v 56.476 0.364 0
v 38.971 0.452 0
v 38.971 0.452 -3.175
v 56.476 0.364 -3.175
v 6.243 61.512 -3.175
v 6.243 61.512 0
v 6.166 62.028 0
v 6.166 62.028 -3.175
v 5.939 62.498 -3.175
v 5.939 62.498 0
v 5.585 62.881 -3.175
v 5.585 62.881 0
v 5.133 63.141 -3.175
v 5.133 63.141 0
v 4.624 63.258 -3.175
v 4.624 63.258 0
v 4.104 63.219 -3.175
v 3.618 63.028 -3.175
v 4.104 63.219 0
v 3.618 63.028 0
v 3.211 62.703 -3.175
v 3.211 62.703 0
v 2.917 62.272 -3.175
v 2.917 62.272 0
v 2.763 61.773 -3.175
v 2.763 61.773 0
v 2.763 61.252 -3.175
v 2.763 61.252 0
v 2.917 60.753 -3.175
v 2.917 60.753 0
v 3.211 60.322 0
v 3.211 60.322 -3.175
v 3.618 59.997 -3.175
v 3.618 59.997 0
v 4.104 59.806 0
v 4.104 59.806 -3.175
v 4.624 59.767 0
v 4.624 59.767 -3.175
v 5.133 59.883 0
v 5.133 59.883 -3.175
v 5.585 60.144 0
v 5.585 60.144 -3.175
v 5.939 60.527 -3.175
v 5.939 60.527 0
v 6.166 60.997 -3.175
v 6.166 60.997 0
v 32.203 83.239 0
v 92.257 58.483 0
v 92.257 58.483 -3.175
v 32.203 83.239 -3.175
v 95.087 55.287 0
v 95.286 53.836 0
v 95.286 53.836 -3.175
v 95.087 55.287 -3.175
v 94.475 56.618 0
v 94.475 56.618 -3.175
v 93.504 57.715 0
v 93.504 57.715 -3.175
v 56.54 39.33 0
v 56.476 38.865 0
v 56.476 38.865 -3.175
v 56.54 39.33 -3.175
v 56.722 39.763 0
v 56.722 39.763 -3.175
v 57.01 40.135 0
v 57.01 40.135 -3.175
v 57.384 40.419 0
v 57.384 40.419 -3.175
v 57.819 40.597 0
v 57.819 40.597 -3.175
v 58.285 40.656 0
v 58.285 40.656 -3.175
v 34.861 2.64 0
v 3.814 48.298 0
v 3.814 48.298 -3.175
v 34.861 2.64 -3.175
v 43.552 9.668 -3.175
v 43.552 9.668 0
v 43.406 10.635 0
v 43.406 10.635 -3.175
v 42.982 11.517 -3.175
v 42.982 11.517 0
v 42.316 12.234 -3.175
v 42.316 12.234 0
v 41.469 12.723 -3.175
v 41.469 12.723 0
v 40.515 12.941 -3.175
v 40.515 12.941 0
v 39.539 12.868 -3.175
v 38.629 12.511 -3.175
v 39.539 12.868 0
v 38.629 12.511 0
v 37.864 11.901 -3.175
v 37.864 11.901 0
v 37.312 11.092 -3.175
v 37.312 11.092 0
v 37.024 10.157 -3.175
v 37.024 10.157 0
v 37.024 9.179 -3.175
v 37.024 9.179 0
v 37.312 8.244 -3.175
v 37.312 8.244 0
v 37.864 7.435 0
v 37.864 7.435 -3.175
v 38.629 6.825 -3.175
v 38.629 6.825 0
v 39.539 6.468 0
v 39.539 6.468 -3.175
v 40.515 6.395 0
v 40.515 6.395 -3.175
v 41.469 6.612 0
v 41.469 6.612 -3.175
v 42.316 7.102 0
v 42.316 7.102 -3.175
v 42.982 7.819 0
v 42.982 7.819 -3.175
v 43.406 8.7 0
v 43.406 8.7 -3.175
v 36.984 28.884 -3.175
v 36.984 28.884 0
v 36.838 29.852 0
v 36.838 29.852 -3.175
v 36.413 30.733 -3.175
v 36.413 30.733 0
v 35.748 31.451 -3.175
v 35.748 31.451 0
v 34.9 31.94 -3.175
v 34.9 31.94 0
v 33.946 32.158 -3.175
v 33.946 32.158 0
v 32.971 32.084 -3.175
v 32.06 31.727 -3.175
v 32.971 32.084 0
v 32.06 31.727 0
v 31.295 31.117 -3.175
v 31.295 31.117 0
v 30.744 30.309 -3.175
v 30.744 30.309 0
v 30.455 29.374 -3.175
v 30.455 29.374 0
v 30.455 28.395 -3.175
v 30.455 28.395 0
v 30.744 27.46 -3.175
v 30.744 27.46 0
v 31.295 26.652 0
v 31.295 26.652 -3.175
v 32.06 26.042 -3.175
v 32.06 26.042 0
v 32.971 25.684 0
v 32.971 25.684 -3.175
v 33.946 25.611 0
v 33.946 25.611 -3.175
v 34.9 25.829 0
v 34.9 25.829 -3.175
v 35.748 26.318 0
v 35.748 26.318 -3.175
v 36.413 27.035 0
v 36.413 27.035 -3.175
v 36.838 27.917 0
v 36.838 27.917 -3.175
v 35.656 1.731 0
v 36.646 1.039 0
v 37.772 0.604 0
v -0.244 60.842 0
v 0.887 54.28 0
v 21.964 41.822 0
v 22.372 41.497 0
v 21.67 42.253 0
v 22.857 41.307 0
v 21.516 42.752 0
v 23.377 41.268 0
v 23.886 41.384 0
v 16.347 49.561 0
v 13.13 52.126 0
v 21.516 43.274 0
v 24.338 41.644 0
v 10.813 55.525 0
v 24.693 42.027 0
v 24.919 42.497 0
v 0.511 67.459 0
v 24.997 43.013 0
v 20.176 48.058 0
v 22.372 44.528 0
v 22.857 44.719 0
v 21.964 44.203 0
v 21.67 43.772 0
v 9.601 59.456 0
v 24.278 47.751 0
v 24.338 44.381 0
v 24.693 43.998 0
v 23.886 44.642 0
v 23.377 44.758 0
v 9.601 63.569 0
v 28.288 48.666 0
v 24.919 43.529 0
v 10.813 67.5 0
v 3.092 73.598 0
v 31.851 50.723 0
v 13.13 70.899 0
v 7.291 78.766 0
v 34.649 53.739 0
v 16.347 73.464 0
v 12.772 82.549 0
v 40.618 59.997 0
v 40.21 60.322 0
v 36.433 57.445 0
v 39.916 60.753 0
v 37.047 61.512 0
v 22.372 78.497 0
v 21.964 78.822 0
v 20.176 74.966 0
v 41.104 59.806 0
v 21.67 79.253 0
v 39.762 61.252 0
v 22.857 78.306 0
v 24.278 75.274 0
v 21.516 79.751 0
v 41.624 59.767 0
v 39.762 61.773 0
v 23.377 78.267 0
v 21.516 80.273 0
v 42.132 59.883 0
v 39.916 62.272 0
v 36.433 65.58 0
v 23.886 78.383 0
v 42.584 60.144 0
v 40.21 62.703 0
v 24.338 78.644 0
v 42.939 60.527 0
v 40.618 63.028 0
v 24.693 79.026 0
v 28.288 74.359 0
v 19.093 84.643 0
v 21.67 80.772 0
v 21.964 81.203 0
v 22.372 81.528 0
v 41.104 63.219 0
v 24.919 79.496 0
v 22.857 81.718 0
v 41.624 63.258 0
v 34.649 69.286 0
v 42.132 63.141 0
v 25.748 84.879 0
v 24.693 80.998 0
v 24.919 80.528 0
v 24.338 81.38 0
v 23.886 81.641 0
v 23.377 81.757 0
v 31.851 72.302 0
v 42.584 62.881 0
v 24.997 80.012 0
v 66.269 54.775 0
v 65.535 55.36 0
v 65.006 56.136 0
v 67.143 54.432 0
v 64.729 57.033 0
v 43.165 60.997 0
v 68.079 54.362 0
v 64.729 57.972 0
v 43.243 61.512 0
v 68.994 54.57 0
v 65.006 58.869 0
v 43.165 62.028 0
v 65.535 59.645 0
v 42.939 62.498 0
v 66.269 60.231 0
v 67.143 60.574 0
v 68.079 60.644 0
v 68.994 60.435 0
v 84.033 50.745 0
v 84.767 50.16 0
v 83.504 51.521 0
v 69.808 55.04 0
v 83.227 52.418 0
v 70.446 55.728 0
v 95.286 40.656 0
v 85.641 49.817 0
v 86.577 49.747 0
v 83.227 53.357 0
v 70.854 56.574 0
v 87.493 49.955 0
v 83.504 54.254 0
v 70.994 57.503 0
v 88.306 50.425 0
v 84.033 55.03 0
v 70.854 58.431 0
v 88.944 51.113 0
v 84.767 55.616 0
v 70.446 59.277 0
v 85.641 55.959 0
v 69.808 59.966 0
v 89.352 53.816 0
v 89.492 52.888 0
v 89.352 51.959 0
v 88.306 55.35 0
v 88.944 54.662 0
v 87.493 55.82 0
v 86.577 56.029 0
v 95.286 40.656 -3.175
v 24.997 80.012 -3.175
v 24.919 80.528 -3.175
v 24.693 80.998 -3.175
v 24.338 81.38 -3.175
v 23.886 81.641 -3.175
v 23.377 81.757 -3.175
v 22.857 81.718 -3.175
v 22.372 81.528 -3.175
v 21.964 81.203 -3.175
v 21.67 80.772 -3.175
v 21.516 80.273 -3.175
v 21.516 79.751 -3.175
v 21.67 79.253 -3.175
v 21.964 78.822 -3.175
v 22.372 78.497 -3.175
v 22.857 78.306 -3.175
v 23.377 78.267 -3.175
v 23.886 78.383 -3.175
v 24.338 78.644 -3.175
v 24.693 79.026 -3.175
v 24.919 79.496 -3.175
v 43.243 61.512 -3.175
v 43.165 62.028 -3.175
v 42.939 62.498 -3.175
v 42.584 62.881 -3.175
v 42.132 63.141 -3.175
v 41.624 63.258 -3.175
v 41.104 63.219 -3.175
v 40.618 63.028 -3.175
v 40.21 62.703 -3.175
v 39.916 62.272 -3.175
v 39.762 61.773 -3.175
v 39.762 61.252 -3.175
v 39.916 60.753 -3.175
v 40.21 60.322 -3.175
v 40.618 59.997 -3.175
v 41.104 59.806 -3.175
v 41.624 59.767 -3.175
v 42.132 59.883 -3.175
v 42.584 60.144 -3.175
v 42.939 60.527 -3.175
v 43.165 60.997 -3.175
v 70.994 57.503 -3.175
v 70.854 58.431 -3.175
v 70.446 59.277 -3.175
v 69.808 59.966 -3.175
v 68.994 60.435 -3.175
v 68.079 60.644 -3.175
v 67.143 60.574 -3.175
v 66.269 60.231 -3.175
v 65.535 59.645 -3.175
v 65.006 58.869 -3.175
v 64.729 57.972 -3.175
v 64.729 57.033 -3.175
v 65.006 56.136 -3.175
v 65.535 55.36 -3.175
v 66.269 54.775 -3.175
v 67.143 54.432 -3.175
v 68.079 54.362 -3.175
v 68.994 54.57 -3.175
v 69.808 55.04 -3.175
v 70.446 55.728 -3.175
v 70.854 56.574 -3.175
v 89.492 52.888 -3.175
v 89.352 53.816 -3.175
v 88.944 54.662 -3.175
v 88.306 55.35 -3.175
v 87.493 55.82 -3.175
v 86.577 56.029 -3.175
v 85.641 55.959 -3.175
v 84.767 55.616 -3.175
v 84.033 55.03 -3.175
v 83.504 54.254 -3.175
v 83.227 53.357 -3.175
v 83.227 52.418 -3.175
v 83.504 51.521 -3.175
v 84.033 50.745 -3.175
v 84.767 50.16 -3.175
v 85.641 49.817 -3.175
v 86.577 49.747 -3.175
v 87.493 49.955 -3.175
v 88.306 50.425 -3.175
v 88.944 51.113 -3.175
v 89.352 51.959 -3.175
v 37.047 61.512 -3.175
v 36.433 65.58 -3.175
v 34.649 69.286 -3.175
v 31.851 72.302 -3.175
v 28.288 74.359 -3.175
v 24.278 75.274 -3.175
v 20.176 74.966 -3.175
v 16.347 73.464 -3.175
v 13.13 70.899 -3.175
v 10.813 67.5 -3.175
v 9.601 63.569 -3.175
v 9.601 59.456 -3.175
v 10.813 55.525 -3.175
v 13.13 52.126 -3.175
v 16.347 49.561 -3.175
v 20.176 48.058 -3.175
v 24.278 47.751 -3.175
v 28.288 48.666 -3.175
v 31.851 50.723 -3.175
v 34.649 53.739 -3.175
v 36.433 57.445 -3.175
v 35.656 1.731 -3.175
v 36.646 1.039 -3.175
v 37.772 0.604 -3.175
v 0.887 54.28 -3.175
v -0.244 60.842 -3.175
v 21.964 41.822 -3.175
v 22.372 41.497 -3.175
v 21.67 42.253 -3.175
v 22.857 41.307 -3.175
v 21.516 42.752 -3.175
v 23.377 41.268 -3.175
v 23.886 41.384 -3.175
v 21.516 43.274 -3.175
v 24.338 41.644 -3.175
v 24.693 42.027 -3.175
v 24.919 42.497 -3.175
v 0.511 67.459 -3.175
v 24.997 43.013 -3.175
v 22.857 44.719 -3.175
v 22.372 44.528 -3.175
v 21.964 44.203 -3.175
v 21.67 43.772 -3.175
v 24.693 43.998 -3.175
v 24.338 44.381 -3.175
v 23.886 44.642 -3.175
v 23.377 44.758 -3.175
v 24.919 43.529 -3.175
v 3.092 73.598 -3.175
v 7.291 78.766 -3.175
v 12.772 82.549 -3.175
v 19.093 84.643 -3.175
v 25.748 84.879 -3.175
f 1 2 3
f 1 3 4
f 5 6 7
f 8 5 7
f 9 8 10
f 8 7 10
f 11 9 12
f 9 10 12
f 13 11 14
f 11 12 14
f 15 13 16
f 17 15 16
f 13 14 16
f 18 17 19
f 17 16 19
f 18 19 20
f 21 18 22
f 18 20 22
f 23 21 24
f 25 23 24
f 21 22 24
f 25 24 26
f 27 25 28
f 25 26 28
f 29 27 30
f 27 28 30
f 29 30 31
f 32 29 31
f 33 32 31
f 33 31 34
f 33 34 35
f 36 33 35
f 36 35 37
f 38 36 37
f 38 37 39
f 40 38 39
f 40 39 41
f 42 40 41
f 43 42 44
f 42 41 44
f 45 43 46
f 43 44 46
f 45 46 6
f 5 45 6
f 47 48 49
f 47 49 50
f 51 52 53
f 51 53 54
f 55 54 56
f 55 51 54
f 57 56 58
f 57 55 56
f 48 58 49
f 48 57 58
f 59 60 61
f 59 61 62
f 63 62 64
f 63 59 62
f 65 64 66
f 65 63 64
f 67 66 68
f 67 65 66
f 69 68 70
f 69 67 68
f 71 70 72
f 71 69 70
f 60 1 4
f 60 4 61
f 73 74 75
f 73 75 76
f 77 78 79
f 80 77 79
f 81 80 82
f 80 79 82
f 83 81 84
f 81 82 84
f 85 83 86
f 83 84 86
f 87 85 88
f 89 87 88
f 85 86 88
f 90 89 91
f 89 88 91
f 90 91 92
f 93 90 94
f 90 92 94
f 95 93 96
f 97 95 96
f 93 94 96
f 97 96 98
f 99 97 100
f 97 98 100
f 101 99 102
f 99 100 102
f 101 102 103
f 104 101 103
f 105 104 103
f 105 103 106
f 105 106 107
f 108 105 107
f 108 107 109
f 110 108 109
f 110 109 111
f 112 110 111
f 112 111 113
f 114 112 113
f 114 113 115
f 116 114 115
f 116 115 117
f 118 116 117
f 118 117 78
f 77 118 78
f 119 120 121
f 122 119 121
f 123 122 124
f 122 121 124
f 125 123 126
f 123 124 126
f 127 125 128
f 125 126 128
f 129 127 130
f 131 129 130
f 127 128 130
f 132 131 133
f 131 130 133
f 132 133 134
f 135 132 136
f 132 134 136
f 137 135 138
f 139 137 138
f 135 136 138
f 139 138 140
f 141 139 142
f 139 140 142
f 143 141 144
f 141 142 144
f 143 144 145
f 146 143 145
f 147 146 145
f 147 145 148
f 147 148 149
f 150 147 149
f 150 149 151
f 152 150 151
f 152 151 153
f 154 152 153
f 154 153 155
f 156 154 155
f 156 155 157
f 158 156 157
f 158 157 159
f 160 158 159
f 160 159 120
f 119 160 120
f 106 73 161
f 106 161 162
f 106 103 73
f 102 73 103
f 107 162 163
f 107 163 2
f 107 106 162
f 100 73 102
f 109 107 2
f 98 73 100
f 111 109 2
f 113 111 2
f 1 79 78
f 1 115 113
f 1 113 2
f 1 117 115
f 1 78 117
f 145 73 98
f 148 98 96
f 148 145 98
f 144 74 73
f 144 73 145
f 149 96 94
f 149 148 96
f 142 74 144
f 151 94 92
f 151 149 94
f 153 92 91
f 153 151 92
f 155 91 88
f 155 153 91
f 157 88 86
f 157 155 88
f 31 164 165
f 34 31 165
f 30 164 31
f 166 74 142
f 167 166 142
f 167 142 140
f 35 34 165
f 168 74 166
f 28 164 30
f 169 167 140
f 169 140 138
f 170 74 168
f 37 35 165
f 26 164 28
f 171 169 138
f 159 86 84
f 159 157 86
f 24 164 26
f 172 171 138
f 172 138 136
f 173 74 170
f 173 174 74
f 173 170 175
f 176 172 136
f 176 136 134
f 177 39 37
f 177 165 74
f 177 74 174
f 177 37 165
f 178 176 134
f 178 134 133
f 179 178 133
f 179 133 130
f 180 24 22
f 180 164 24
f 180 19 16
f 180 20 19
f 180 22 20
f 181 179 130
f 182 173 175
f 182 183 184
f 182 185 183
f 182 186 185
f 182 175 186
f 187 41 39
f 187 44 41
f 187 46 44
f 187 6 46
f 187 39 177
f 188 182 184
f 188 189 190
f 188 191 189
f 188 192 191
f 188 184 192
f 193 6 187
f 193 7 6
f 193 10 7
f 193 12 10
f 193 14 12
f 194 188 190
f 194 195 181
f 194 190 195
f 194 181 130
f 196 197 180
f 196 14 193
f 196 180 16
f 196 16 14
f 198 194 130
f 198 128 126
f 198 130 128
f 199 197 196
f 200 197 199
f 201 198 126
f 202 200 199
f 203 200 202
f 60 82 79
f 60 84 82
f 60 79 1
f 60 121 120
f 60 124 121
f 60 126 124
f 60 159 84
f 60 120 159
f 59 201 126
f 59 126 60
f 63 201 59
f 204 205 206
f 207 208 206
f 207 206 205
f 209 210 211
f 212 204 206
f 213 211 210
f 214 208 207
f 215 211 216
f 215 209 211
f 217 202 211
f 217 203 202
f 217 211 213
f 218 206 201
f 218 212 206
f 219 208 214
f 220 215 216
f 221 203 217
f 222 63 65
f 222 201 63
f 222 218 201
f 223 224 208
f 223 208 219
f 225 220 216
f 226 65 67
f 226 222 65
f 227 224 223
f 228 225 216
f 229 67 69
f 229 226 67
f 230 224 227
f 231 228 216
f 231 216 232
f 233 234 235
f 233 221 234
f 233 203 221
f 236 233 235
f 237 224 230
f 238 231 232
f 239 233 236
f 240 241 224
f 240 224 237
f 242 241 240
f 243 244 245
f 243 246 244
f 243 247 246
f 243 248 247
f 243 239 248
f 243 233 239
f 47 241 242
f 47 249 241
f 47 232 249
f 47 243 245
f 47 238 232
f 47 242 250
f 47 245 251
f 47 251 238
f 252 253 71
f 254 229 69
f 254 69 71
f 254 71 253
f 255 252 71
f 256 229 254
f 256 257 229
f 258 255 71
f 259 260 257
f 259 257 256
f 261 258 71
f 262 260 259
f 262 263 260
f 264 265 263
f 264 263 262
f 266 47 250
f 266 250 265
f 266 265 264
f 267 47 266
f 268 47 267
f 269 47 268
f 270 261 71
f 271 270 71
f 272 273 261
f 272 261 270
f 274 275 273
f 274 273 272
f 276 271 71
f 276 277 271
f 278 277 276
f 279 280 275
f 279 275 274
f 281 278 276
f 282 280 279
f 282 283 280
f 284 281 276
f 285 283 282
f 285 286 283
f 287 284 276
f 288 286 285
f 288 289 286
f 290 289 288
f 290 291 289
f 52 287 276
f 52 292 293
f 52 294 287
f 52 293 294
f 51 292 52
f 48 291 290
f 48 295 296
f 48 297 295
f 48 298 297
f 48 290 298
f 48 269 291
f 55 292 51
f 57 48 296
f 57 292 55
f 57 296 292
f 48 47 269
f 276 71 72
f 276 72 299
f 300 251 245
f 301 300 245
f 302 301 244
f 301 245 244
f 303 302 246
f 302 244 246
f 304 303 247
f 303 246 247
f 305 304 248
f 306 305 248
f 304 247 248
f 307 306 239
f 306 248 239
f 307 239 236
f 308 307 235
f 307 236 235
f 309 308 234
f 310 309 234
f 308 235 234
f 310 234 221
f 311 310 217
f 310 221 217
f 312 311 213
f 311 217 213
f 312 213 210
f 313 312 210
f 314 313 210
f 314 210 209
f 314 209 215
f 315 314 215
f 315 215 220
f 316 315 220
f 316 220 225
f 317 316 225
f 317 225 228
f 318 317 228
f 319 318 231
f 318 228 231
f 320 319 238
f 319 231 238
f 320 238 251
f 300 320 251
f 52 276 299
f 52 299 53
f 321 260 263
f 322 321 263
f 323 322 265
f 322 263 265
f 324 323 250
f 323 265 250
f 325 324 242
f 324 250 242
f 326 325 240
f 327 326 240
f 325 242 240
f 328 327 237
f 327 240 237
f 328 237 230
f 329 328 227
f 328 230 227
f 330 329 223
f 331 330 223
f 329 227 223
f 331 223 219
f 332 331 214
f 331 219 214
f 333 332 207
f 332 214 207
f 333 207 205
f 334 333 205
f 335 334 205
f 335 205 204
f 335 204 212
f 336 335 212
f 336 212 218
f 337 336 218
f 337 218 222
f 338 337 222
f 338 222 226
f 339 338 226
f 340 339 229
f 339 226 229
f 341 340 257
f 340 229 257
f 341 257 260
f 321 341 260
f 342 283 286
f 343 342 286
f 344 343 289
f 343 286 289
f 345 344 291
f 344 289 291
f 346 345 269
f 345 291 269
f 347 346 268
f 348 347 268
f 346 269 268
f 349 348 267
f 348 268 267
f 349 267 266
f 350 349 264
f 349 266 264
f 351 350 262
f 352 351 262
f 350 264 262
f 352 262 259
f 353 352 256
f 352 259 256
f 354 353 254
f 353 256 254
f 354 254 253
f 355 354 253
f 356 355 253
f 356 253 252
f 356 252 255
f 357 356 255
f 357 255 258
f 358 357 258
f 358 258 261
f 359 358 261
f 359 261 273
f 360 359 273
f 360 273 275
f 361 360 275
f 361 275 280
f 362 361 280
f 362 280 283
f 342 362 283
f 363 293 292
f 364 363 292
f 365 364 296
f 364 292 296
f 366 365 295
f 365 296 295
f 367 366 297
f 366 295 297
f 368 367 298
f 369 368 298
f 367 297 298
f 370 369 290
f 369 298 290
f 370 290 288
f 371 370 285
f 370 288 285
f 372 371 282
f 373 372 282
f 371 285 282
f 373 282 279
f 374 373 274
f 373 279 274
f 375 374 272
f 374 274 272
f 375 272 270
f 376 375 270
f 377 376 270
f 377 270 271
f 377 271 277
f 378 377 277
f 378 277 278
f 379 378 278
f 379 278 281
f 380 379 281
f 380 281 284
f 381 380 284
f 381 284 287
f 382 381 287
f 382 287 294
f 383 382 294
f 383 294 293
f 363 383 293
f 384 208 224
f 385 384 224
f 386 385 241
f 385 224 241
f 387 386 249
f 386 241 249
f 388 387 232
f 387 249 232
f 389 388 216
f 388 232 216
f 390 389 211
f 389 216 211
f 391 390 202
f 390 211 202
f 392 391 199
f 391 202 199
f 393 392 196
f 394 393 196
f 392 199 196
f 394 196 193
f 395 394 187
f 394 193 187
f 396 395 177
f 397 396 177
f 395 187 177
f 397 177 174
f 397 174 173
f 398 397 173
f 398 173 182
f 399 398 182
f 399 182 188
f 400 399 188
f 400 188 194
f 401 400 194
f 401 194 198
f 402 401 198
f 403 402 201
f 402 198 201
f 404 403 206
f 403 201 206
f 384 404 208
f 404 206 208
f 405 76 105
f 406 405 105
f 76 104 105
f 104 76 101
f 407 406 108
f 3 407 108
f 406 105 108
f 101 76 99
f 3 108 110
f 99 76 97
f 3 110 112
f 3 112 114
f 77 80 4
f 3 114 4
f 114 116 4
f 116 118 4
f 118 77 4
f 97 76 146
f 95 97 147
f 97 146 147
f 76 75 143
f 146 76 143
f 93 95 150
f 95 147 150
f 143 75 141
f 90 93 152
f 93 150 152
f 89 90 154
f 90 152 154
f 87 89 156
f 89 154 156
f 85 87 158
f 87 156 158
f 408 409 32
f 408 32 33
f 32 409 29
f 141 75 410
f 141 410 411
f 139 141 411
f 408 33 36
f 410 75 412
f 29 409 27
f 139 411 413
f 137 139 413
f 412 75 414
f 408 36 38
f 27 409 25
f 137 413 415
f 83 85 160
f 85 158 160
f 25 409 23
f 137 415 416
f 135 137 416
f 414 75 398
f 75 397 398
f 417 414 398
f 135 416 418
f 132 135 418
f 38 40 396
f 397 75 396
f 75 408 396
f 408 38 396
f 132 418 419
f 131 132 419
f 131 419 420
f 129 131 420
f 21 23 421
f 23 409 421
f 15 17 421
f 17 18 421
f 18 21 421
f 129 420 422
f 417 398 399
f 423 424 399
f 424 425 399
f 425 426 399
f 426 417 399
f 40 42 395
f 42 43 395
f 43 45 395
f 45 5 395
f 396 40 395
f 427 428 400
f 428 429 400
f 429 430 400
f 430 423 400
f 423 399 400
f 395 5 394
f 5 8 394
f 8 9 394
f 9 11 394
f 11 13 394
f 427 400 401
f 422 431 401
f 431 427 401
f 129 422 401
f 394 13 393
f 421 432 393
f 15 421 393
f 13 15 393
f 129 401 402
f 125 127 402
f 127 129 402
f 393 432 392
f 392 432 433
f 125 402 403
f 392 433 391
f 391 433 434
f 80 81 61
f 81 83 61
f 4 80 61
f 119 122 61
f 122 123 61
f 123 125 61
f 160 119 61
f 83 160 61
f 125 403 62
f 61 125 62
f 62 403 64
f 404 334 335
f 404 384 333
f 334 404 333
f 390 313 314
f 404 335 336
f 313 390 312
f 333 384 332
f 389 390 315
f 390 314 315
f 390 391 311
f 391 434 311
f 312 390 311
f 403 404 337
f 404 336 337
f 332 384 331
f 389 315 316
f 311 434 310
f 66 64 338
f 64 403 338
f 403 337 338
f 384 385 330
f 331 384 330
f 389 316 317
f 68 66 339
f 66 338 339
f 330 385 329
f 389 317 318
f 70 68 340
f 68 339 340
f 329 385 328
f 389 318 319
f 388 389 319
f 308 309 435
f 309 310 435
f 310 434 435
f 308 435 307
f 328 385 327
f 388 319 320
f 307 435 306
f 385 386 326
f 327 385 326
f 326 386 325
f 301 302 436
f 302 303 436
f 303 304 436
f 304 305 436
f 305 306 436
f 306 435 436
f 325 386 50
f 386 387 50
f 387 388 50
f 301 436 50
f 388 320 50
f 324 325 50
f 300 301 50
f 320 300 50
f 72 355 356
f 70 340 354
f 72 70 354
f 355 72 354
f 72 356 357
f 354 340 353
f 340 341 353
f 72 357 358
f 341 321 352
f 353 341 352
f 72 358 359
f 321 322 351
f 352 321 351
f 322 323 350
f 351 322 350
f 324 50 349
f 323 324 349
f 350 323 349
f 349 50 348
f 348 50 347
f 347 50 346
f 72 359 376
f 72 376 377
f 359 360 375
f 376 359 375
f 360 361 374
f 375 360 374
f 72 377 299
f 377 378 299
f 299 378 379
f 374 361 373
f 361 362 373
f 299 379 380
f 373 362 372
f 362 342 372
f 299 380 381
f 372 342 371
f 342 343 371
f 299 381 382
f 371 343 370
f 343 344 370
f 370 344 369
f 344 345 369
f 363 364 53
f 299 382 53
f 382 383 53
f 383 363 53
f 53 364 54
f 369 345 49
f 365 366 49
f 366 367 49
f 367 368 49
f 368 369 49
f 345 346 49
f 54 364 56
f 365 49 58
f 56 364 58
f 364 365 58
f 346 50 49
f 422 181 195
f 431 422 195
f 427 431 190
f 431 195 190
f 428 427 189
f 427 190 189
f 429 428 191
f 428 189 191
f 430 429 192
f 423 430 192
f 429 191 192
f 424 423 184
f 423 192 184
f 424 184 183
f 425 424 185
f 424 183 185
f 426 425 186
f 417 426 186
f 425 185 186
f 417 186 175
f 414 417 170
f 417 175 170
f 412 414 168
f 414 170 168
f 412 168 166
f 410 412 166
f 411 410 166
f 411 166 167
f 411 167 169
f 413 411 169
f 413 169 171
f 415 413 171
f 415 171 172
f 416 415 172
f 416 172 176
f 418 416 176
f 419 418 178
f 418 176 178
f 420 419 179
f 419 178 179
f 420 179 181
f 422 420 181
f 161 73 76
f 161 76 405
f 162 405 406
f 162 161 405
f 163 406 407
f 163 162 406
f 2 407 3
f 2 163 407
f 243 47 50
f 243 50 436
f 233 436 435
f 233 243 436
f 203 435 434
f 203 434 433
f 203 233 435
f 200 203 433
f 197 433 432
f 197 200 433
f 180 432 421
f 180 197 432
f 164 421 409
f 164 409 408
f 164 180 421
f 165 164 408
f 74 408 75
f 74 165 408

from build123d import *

# Parameters (mm, degrees)
SKETCH1_R          = 1.75
SKETCH1_R_2        = 13.8
BASE_FLANGE1_DEPTH = 3.175
SKETCH6_R          = 3.15
SKETCH6_R_2        = 3.282457618
CUT_EXTRUDE1_DEPTH = 128.736584442


# Sheet-metal steps are written as plain solids
with BuildPart() as part:
    # Sketch1 → Base-Flange1 (new body)
    with BuildSketch(Plane.XY):
        with BuildLine():
            Line((38.970667364, 0.451979476), (56.476339415, 0.364231306))
            Line((56.476339415, 0.364231306), (56.476339415, 38.864663006))
            ThreePointArc((56.476339415, 38.864663006), (57.009920449, 40.134796597), (58.285339291, 40.655617905))
            Line((58.285339291, 40.655617905), (95.285804475, 40.655617905))
            Line((95.285804475, 40.655617905), (95.285804475, 53.835620703))
            ThreePointArc((95.285804475, 53.835620703), (94.475239571, 56.617857644), (92.257476371, 58.483168407))
            Line((92.257476371, 58.483168407), (32.202639785, 83.238911906))
            ThreePointArc((32.202639785, 83.238911906), (5.007775741, 76.331219775), (3.813808252, 48.29818065))
            Line((3.813808252, 48.29818065), (34.861096289, 2.640368074))
            ThreePointArc((34.861096289, 2.640368074), (36.645617305, 1.038644509), (38.970667364, 0.451979476))
        make_face()
        with Locations((23.246582606, 43.012689186)):
            Circle(SKETCH1_R, mode=Mode.SUBTRACT)
        with Locations((4.493399578, 61.512456777)):
            Circle(SKETCH1_R, mode=Mode.SUBTRACT)
        with Locations((23.246582606, 80.012224369)):
            Circle(SKETCH1_R, mode=Mode.SUBTRACT)
        with Locations((41.492934761, 61.512456777)):
            Circle(SKETCH1_R, mode=Mode.SUBTRACT)
        with Locations((23.246582606, 61.512456777)):
            Circle(SKETCH1_R_2, mode=Mode.SUBTRACT)
    extrude(amount=-BASE_FLANGE1_DEPTH)

    # Sketch6 → Cut-Extrude1 (cut, through all)
    with BuildSketch(Plane.XY):
        with Locations((86.341786245, 52.887725453)):
            Circle(SKETCH6_R)
        with Locations((40.269797133, 9.667877899)):
            Circle(SKETCH6_R_2)
        with Locations((33.701172349, 28.884316382)):
            Circle(SKETCH6_R_2)
        with Locations((67.843667948, 57.502749994)):
            Circle(SKETCH6_R)
    extrude(amount=-CUT_EXTRUDE1_DEPTH, mode=Mode.SUBTRACT)


solid = part.part
